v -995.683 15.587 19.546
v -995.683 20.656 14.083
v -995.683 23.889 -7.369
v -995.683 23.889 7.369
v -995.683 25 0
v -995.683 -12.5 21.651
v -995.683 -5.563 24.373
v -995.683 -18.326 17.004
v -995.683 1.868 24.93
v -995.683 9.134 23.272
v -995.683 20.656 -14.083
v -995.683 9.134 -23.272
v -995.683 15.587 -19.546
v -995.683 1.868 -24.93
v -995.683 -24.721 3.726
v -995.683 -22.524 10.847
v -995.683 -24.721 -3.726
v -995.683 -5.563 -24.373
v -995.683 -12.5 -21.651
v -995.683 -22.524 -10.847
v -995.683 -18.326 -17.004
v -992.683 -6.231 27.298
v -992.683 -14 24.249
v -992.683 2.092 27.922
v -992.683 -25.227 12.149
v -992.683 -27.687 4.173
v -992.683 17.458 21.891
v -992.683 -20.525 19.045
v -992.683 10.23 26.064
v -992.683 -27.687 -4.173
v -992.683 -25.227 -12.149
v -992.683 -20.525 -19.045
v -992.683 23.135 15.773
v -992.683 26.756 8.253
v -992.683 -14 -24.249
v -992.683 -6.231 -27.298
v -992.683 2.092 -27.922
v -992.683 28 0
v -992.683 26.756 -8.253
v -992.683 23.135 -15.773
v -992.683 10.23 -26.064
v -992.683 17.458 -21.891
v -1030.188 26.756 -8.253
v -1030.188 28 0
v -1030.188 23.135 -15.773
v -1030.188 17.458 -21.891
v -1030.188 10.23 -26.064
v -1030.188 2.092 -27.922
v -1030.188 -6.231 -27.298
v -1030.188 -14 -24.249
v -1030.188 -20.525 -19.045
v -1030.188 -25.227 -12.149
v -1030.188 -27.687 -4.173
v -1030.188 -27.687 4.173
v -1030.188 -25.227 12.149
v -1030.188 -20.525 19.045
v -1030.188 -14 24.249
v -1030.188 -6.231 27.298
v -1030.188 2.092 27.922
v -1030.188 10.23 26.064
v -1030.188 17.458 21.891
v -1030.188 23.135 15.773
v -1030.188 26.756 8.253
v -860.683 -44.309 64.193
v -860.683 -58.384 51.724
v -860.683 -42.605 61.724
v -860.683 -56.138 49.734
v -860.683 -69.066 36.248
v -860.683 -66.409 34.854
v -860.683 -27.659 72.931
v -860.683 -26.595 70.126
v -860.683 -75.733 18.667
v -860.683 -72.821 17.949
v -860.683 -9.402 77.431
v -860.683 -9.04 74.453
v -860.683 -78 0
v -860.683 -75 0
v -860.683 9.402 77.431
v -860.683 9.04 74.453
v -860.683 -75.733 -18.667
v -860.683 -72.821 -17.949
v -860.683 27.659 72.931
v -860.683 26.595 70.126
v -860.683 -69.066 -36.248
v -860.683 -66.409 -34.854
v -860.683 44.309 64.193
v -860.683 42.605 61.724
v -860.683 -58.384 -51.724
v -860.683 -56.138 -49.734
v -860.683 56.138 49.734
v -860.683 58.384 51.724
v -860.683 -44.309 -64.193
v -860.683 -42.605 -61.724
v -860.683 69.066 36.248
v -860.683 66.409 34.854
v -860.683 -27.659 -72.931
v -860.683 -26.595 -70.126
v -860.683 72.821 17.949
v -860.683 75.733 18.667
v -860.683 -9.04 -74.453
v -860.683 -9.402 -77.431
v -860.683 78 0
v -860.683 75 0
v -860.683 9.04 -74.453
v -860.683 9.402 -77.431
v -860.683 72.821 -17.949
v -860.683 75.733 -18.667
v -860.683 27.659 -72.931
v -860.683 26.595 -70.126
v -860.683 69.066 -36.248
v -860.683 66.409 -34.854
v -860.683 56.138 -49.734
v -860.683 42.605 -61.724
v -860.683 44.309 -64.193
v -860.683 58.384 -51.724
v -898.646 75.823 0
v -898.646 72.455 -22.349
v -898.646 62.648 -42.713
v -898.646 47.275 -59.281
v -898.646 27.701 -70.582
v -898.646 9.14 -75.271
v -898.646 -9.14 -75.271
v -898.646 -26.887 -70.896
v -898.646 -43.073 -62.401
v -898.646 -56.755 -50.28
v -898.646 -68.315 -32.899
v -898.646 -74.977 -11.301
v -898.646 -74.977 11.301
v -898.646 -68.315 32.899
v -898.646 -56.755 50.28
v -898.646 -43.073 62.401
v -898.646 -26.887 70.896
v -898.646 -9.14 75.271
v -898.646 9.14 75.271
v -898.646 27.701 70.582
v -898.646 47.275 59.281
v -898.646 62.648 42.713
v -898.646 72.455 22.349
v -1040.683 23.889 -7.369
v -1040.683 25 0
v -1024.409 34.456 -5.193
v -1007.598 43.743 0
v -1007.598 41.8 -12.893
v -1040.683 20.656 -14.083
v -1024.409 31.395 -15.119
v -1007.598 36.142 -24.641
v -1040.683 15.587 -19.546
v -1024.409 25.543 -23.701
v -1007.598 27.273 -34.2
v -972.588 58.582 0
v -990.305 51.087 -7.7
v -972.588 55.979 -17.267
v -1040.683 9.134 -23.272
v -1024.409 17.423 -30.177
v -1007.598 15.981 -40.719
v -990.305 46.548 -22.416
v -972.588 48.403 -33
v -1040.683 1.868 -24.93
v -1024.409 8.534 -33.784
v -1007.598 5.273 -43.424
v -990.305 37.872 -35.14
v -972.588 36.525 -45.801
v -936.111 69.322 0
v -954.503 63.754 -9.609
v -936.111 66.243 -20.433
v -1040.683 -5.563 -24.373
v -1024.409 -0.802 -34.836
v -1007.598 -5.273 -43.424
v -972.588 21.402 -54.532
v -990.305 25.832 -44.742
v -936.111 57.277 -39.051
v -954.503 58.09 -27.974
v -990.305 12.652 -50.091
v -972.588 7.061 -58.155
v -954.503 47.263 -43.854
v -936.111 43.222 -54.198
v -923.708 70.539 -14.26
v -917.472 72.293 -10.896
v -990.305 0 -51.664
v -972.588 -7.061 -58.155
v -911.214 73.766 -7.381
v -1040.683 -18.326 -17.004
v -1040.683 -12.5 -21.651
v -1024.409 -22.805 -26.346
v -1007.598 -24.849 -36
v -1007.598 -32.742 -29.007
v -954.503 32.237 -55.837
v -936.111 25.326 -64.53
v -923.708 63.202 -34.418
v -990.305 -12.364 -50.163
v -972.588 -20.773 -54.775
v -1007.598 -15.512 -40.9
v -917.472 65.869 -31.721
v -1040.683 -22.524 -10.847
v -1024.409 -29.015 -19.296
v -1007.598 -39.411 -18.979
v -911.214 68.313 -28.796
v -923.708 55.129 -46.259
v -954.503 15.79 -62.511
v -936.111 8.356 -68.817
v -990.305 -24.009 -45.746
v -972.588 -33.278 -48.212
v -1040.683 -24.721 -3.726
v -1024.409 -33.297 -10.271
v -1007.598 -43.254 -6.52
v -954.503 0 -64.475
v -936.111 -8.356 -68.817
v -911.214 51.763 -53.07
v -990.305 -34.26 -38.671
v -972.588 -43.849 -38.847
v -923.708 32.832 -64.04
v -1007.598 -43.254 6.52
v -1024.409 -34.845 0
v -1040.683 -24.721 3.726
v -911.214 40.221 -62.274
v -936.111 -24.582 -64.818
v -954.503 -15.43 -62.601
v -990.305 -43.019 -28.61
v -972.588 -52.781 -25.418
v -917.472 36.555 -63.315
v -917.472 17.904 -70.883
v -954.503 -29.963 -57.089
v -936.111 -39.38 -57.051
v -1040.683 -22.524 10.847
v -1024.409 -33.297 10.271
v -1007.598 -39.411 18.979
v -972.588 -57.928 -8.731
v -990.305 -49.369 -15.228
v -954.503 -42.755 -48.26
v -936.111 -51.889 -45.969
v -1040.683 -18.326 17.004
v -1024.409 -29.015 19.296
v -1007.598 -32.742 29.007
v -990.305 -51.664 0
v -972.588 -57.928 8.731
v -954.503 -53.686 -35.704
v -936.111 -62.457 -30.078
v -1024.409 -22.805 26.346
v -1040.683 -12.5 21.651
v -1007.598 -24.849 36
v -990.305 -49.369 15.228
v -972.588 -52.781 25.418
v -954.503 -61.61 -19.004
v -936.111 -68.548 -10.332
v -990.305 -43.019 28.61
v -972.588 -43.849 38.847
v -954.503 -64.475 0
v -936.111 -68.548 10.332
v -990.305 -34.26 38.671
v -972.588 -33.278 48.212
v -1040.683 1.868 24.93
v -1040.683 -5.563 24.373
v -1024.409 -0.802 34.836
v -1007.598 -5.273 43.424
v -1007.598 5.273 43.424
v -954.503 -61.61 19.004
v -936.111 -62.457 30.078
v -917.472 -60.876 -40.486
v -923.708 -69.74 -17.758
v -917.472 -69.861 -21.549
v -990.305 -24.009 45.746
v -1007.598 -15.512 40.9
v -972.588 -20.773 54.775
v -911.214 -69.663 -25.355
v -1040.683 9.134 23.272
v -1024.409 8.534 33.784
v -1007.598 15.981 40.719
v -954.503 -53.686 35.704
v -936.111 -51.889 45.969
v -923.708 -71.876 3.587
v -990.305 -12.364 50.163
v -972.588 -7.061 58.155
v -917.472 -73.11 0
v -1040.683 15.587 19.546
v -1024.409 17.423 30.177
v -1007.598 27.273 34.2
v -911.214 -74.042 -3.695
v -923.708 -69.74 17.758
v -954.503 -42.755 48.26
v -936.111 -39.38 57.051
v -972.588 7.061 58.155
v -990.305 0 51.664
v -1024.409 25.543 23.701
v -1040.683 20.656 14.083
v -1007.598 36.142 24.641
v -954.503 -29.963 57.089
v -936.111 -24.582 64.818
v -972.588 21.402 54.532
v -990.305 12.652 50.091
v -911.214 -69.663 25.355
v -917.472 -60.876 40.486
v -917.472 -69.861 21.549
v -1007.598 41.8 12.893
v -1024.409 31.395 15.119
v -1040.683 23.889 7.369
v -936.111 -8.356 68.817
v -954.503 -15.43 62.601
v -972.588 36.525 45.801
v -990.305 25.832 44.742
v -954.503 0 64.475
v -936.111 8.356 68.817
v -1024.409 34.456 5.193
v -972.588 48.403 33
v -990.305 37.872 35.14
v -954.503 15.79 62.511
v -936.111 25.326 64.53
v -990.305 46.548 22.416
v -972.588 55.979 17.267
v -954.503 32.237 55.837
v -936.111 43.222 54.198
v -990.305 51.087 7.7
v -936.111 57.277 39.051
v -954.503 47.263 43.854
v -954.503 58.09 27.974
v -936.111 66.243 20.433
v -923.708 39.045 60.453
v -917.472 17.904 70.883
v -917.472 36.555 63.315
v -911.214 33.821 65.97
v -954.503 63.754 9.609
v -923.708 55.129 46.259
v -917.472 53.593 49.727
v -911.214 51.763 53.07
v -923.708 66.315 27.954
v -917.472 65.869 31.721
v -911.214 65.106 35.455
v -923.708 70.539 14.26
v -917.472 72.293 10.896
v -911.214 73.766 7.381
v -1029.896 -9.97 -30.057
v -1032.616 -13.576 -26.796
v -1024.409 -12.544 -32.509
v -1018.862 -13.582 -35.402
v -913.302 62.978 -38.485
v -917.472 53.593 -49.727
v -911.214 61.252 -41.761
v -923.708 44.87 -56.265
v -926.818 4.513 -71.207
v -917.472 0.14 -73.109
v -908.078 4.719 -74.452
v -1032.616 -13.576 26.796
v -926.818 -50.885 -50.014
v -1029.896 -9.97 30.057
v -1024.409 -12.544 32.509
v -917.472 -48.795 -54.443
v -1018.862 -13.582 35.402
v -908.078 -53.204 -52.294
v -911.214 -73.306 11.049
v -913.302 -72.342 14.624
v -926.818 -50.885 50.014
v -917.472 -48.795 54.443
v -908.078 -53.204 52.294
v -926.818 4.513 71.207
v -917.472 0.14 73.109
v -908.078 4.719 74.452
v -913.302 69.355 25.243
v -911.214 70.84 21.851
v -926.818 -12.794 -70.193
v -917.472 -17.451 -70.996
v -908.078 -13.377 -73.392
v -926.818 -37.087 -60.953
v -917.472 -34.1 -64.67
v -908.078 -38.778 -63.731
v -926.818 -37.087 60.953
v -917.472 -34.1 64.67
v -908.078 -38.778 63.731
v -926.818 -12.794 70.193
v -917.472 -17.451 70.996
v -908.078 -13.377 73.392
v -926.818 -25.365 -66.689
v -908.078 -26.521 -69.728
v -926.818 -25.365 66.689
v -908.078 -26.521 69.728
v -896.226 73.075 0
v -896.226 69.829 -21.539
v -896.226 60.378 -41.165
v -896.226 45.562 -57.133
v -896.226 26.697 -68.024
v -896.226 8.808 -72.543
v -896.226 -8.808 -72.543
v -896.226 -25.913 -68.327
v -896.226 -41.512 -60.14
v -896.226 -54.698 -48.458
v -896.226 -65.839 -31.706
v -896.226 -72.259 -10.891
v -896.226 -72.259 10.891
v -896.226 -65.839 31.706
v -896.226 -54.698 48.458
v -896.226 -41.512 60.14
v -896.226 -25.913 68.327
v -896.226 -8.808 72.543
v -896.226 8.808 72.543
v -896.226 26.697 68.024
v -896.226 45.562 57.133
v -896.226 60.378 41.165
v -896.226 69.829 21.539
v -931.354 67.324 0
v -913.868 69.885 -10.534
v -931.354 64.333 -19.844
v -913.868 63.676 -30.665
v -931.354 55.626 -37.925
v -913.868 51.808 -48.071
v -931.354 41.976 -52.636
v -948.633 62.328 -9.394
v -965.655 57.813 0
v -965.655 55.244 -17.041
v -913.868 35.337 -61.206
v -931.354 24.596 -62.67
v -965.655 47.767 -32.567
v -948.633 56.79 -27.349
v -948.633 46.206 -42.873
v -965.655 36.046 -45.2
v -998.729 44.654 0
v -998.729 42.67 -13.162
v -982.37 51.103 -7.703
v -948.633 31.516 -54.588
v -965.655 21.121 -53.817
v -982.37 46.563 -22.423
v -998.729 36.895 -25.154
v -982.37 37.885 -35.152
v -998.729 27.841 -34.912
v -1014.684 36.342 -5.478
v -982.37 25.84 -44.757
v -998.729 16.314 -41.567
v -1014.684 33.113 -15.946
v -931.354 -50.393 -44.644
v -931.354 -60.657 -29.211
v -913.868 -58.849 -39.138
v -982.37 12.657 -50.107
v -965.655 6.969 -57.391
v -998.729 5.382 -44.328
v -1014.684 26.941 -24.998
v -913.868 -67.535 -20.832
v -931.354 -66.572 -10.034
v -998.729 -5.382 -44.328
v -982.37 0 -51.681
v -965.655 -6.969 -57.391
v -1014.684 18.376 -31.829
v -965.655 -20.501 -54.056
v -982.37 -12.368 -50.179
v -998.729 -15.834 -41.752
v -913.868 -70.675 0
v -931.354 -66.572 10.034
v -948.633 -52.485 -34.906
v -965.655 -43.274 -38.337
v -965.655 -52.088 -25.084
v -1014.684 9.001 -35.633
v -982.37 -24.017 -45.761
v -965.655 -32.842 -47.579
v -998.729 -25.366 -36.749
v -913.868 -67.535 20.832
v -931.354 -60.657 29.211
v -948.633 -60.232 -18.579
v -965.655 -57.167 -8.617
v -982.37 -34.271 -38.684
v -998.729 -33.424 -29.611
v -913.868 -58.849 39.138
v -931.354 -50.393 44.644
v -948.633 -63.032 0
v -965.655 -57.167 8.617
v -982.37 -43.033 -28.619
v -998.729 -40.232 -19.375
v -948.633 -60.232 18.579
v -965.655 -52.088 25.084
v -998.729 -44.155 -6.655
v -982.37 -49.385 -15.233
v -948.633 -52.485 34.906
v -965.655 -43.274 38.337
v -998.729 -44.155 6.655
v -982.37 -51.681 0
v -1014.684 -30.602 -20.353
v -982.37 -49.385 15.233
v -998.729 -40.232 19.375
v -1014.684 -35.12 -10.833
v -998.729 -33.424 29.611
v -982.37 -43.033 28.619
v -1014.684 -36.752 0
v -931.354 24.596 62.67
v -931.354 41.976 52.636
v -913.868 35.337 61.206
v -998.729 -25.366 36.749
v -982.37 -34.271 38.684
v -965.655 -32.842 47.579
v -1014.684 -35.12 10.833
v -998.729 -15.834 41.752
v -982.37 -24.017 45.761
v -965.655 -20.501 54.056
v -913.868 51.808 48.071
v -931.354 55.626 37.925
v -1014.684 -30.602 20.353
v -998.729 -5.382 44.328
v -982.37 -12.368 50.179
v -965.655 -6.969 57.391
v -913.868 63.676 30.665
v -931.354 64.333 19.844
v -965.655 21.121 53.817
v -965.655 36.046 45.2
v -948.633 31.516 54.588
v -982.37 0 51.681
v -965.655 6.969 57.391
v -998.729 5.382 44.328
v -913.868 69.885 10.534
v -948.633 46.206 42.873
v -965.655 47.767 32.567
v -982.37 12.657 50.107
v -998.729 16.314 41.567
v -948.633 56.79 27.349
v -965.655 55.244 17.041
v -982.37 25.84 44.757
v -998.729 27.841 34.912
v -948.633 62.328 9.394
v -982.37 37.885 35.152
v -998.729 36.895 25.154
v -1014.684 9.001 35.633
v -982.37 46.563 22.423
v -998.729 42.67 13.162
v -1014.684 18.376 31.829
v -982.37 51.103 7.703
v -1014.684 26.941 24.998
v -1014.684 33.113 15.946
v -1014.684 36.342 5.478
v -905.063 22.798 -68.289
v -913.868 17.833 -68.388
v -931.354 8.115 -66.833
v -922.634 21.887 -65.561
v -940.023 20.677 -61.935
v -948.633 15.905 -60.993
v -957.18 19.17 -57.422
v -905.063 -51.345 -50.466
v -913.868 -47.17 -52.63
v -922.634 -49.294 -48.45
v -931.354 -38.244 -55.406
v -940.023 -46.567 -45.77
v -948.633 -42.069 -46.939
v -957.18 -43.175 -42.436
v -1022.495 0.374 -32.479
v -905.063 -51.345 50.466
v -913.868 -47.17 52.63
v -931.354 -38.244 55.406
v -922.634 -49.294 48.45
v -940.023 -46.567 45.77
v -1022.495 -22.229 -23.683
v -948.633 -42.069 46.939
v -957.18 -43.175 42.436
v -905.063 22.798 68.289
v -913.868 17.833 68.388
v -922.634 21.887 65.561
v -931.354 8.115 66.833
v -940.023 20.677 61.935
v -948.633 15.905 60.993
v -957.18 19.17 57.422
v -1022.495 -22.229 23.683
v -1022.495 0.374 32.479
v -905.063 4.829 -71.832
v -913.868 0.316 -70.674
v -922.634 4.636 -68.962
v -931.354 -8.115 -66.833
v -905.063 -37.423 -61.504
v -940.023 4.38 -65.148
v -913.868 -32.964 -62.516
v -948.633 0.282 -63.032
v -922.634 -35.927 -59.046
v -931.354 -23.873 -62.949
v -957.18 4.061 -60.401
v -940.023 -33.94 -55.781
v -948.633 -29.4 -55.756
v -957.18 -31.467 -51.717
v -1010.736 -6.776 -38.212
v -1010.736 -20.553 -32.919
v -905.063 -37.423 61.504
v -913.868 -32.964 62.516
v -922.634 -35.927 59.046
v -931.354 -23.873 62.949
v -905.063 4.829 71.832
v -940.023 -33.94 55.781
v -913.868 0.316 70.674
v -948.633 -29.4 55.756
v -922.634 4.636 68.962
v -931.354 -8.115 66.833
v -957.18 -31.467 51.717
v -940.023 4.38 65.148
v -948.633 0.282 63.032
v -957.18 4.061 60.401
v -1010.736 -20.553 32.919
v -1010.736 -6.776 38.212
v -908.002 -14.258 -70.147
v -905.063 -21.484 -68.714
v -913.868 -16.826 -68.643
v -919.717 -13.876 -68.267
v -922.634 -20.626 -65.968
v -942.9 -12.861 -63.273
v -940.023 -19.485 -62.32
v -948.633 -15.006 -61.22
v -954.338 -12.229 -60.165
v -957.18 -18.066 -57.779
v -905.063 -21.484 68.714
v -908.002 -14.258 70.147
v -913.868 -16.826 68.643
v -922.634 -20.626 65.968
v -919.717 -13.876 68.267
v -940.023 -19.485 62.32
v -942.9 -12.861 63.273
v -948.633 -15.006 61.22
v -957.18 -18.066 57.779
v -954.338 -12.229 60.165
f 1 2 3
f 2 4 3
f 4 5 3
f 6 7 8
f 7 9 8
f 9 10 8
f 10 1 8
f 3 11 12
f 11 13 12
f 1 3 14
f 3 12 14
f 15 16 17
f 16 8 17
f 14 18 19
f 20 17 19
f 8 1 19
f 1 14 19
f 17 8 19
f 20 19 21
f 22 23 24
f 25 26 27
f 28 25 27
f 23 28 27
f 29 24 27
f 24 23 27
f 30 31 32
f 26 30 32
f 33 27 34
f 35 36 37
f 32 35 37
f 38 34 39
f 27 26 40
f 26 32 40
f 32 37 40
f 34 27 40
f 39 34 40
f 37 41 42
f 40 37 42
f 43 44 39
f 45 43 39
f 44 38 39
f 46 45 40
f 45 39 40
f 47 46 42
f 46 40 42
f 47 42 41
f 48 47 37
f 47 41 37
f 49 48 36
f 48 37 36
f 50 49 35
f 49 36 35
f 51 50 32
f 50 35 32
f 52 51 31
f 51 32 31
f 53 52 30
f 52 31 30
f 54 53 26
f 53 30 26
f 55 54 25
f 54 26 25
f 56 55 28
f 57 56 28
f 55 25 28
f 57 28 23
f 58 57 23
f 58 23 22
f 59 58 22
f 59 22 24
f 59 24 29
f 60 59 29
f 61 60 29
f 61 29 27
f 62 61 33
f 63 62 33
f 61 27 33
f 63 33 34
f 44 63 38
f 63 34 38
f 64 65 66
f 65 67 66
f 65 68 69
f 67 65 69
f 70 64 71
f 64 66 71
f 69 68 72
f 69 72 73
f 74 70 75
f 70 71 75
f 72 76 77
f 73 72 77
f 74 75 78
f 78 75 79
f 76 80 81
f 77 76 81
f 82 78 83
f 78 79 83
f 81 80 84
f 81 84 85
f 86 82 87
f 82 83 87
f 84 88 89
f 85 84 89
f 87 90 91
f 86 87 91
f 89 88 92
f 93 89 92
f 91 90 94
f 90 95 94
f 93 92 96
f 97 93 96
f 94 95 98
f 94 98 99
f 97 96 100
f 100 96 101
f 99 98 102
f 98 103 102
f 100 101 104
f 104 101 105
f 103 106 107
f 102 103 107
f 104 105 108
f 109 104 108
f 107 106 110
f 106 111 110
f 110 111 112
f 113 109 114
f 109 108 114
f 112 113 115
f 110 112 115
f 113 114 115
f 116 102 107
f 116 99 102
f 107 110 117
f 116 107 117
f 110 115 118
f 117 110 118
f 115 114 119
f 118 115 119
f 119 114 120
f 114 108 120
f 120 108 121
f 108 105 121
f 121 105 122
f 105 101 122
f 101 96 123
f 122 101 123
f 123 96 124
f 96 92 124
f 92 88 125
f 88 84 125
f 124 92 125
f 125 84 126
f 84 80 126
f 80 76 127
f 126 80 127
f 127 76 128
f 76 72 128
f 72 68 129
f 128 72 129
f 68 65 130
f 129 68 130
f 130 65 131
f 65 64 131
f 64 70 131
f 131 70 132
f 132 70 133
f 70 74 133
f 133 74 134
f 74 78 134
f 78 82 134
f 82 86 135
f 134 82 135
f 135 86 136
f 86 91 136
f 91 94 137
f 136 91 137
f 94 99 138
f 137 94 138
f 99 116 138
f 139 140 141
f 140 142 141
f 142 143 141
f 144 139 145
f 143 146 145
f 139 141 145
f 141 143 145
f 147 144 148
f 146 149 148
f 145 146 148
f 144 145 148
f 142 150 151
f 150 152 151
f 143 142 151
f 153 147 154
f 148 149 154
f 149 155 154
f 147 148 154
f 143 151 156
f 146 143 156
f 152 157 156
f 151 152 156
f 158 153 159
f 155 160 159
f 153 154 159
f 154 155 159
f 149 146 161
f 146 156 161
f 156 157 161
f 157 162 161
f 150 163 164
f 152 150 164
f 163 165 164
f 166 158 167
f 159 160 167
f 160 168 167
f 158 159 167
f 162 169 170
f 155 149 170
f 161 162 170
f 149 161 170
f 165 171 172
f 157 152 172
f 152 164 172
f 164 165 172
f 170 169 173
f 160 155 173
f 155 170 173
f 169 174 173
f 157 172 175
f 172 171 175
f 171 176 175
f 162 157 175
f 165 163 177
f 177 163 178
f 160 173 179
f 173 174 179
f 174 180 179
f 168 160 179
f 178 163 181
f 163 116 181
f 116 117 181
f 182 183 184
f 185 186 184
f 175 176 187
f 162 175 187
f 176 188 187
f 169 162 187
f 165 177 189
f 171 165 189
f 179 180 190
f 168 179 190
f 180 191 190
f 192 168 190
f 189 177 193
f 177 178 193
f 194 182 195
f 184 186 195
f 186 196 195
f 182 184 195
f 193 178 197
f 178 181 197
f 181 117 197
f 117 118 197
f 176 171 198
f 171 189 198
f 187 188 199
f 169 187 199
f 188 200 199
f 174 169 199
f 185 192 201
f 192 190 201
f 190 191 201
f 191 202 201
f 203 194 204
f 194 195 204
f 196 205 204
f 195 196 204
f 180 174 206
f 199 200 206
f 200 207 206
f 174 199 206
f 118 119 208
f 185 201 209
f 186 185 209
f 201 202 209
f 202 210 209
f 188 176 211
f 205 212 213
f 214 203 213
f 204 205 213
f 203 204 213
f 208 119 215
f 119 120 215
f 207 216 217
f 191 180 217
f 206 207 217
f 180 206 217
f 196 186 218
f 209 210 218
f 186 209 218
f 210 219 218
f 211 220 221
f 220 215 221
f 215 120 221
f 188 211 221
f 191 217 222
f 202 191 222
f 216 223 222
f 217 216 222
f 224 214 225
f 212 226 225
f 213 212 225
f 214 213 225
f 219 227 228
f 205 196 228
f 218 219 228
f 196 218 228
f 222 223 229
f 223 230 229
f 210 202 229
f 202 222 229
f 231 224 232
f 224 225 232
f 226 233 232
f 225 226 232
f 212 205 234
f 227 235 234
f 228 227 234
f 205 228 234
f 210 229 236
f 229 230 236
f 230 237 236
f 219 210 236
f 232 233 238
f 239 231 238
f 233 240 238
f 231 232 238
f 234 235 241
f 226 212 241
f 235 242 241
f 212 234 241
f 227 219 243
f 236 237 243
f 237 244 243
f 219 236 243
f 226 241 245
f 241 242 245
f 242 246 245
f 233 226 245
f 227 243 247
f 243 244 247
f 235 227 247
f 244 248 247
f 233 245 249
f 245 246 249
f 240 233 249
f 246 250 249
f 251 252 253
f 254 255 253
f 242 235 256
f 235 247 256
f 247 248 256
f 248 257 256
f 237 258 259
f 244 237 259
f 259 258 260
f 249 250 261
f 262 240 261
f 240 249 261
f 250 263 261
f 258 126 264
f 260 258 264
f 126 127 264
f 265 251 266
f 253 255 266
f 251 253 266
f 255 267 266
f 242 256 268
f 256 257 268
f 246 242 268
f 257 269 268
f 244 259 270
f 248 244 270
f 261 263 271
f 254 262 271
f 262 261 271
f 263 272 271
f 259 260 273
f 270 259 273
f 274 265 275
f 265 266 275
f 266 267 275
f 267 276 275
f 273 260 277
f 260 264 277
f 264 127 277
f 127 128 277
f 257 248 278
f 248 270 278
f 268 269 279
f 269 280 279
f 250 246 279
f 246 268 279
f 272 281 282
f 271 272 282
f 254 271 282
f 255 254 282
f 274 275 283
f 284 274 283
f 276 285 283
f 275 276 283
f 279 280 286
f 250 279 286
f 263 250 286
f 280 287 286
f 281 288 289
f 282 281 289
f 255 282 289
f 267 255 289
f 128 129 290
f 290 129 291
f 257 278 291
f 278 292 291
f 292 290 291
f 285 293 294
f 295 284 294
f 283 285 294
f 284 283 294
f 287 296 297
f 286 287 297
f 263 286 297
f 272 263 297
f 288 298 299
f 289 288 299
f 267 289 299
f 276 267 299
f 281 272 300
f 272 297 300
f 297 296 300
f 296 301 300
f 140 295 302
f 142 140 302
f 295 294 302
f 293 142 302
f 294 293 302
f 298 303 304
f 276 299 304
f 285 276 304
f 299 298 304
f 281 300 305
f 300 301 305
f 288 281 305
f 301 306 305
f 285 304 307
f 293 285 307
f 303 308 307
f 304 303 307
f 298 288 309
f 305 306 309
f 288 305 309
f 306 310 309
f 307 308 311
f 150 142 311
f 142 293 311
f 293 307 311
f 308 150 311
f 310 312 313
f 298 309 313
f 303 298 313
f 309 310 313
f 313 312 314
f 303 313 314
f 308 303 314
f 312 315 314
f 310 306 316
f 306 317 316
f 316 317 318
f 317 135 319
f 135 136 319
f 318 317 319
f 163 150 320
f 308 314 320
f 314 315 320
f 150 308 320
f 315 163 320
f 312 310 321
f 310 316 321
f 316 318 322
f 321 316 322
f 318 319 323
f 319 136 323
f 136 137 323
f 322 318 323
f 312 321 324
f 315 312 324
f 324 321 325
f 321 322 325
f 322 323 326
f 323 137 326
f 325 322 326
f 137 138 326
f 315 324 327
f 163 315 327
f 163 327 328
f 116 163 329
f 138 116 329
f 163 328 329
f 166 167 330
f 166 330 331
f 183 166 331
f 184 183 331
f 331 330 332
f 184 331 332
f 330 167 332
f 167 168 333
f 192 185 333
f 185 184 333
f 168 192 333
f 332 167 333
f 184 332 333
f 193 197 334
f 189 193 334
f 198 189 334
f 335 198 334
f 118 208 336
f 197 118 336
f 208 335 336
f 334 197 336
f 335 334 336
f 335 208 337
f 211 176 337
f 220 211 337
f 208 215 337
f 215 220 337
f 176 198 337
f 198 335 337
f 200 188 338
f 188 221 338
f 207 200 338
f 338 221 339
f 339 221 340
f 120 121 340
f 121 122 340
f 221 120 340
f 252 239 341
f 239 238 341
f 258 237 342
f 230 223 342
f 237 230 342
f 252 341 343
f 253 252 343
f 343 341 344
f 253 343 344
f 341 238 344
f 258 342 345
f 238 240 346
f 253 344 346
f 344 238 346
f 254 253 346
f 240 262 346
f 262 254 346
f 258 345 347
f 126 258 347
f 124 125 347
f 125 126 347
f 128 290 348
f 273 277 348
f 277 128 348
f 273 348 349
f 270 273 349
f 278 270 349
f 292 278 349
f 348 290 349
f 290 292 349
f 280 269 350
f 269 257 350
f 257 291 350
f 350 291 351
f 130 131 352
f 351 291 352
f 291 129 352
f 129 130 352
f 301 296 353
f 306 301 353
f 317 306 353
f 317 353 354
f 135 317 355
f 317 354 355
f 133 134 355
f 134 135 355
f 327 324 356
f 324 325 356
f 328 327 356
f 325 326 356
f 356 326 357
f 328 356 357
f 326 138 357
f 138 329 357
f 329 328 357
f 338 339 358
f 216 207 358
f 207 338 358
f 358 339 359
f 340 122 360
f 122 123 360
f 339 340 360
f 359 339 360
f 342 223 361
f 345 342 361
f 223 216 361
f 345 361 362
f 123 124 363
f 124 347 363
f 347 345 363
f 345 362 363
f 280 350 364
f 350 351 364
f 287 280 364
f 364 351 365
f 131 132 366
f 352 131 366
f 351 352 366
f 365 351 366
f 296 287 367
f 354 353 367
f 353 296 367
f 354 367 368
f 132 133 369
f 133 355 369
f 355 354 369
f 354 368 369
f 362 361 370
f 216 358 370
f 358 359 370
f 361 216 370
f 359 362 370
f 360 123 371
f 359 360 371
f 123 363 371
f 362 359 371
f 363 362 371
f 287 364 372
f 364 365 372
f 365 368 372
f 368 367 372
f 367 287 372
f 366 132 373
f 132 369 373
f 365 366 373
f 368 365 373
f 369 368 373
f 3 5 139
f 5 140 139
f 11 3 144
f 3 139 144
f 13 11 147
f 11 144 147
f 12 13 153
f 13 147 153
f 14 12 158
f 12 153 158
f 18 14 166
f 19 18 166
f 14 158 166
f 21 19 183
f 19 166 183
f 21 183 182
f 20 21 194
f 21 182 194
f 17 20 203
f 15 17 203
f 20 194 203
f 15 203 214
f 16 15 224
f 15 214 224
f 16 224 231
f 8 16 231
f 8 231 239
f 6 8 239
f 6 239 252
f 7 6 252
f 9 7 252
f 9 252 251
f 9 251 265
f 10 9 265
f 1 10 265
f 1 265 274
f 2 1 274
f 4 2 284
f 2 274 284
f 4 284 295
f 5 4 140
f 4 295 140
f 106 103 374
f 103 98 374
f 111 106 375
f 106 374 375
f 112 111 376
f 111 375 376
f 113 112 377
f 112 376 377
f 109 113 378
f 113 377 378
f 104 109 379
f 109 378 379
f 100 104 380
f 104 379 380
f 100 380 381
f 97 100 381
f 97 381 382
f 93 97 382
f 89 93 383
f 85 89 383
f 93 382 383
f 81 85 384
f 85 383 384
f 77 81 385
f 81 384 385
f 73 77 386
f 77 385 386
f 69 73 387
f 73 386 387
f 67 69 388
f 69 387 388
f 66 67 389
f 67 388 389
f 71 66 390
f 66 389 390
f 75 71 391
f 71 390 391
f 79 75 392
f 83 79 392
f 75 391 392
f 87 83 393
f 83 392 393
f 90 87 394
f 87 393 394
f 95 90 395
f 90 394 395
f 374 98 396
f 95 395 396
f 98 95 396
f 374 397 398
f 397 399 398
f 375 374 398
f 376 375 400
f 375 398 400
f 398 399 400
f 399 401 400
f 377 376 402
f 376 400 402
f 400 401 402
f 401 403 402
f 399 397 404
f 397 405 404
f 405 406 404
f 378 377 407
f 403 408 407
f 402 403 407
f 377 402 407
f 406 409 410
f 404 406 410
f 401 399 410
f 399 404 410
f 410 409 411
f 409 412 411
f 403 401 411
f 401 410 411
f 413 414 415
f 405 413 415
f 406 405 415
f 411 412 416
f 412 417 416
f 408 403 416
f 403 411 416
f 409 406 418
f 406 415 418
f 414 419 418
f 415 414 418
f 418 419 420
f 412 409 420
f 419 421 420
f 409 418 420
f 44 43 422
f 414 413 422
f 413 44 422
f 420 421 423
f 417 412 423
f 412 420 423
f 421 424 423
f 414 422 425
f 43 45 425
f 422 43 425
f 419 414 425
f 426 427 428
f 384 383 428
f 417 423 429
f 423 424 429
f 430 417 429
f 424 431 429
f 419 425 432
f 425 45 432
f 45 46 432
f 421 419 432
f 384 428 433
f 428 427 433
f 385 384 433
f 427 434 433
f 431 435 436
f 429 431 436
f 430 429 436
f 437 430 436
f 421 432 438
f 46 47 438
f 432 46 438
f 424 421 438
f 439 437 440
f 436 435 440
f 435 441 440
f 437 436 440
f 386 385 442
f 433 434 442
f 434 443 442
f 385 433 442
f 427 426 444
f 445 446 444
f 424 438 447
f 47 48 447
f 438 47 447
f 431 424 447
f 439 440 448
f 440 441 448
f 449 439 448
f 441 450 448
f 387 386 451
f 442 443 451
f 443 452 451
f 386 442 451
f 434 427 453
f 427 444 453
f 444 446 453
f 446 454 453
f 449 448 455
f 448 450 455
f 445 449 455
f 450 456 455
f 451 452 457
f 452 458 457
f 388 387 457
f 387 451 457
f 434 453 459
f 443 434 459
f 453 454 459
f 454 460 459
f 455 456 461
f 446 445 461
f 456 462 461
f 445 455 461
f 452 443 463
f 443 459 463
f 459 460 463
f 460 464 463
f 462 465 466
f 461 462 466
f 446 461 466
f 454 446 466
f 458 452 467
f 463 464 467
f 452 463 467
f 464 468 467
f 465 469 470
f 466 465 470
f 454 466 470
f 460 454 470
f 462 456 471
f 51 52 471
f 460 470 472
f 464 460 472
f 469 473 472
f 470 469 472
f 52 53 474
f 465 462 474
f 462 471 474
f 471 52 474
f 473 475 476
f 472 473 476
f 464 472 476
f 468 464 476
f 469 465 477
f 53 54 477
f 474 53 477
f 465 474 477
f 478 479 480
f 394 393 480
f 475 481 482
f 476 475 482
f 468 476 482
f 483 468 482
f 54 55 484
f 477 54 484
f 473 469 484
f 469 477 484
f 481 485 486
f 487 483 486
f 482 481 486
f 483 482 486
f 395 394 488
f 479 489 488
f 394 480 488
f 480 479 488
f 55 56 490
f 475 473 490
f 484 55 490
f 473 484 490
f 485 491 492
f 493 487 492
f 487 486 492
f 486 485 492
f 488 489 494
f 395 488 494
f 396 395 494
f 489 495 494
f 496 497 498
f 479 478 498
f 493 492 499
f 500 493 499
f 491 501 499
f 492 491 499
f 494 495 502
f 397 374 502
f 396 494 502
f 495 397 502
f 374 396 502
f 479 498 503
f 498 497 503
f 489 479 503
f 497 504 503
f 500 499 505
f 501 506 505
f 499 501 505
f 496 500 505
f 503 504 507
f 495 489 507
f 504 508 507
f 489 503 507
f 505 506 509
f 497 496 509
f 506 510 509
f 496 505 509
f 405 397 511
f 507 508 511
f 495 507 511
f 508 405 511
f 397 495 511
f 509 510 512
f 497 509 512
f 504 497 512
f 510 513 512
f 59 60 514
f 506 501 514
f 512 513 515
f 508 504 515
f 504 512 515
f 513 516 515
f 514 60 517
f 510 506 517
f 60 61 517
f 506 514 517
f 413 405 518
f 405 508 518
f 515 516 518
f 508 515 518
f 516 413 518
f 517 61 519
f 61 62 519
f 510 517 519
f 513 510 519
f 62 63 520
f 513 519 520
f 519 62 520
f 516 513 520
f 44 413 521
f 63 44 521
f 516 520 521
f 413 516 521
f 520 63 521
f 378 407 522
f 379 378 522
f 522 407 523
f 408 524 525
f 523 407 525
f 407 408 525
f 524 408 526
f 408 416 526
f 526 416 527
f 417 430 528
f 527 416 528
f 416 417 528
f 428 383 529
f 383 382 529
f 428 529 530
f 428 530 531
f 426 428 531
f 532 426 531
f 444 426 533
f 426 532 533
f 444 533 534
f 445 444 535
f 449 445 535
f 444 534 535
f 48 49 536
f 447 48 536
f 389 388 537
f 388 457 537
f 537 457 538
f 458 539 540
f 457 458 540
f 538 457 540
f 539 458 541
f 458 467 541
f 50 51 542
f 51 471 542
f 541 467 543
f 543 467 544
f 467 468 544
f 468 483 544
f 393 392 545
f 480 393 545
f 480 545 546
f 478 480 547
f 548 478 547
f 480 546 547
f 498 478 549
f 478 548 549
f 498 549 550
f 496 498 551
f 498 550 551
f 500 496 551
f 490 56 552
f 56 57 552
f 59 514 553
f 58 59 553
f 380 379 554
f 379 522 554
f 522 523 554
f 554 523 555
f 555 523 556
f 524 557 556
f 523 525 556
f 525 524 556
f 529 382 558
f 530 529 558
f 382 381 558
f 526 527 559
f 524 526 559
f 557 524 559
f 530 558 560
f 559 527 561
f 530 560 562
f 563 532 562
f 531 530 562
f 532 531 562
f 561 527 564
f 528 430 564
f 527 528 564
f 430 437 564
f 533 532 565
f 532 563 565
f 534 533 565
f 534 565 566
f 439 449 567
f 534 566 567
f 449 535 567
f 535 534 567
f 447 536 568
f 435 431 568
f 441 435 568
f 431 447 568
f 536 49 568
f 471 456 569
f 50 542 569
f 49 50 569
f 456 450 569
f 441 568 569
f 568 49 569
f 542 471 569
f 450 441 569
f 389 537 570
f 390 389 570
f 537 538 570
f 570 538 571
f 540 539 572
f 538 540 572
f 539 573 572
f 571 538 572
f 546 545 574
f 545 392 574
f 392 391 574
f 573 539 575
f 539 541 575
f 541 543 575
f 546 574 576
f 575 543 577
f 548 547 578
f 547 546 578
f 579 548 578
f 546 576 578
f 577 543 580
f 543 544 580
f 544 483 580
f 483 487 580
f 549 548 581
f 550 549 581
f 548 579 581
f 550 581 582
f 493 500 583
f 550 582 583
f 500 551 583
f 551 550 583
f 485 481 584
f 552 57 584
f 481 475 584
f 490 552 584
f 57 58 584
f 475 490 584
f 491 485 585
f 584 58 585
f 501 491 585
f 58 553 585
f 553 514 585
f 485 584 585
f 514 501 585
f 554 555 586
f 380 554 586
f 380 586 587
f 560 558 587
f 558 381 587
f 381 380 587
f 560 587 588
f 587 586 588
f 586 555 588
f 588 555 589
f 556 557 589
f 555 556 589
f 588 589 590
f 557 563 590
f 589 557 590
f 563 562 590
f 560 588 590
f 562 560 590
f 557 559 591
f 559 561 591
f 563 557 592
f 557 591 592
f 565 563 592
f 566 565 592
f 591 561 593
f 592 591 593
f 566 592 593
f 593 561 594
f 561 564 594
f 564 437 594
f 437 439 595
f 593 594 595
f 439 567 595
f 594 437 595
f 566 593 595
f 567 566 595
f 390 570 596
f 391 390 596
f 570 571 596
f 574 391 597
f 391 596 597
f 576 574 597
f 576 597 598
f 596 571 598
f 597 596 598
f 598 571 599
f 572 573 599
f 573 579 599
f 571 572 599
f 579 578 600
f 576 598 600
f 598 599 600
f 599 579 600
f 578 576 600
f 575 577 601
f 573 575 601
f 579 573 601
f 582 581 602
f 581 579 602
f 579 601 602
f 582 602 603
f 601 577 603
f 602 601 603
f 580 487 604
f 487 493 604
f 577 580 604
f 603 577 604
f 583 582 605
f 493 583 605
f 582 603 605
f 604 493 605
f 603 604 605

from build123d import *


with BuildPart() as part:
    # Sketch1 → Revolve1 (revolve)
    with BuildSketch(Plane.XY):
        with BuildLine():
            Line((-860.682976555, 78), (-860.682976555, 75))
            ThreePointArc((-860.682976555, 75), (-948.633353859, 63.032442792), (-1030.188361342, 28))
            Line((-1030.188361342, 28), (-992.682976555, 28))
            Line((-992.682976555, 28), (-992.682976555, 0))
            Line((-992.682976555, 0), (-995.682976555, 0))
            Line((-995.682976555, 0), (-995.682976555, 25))
            Line((-995.682976555, 25), (-1040.682976555, 25))
            ThreePointArc((-1040.682976555, 25), (-954.503283525, 64.474627446), (-860.682976555, 78))
        make_face()
    revolve(axis=Axis((-860.682976555, 0, 0), (-1, 0, 0)))


solid = part.part
